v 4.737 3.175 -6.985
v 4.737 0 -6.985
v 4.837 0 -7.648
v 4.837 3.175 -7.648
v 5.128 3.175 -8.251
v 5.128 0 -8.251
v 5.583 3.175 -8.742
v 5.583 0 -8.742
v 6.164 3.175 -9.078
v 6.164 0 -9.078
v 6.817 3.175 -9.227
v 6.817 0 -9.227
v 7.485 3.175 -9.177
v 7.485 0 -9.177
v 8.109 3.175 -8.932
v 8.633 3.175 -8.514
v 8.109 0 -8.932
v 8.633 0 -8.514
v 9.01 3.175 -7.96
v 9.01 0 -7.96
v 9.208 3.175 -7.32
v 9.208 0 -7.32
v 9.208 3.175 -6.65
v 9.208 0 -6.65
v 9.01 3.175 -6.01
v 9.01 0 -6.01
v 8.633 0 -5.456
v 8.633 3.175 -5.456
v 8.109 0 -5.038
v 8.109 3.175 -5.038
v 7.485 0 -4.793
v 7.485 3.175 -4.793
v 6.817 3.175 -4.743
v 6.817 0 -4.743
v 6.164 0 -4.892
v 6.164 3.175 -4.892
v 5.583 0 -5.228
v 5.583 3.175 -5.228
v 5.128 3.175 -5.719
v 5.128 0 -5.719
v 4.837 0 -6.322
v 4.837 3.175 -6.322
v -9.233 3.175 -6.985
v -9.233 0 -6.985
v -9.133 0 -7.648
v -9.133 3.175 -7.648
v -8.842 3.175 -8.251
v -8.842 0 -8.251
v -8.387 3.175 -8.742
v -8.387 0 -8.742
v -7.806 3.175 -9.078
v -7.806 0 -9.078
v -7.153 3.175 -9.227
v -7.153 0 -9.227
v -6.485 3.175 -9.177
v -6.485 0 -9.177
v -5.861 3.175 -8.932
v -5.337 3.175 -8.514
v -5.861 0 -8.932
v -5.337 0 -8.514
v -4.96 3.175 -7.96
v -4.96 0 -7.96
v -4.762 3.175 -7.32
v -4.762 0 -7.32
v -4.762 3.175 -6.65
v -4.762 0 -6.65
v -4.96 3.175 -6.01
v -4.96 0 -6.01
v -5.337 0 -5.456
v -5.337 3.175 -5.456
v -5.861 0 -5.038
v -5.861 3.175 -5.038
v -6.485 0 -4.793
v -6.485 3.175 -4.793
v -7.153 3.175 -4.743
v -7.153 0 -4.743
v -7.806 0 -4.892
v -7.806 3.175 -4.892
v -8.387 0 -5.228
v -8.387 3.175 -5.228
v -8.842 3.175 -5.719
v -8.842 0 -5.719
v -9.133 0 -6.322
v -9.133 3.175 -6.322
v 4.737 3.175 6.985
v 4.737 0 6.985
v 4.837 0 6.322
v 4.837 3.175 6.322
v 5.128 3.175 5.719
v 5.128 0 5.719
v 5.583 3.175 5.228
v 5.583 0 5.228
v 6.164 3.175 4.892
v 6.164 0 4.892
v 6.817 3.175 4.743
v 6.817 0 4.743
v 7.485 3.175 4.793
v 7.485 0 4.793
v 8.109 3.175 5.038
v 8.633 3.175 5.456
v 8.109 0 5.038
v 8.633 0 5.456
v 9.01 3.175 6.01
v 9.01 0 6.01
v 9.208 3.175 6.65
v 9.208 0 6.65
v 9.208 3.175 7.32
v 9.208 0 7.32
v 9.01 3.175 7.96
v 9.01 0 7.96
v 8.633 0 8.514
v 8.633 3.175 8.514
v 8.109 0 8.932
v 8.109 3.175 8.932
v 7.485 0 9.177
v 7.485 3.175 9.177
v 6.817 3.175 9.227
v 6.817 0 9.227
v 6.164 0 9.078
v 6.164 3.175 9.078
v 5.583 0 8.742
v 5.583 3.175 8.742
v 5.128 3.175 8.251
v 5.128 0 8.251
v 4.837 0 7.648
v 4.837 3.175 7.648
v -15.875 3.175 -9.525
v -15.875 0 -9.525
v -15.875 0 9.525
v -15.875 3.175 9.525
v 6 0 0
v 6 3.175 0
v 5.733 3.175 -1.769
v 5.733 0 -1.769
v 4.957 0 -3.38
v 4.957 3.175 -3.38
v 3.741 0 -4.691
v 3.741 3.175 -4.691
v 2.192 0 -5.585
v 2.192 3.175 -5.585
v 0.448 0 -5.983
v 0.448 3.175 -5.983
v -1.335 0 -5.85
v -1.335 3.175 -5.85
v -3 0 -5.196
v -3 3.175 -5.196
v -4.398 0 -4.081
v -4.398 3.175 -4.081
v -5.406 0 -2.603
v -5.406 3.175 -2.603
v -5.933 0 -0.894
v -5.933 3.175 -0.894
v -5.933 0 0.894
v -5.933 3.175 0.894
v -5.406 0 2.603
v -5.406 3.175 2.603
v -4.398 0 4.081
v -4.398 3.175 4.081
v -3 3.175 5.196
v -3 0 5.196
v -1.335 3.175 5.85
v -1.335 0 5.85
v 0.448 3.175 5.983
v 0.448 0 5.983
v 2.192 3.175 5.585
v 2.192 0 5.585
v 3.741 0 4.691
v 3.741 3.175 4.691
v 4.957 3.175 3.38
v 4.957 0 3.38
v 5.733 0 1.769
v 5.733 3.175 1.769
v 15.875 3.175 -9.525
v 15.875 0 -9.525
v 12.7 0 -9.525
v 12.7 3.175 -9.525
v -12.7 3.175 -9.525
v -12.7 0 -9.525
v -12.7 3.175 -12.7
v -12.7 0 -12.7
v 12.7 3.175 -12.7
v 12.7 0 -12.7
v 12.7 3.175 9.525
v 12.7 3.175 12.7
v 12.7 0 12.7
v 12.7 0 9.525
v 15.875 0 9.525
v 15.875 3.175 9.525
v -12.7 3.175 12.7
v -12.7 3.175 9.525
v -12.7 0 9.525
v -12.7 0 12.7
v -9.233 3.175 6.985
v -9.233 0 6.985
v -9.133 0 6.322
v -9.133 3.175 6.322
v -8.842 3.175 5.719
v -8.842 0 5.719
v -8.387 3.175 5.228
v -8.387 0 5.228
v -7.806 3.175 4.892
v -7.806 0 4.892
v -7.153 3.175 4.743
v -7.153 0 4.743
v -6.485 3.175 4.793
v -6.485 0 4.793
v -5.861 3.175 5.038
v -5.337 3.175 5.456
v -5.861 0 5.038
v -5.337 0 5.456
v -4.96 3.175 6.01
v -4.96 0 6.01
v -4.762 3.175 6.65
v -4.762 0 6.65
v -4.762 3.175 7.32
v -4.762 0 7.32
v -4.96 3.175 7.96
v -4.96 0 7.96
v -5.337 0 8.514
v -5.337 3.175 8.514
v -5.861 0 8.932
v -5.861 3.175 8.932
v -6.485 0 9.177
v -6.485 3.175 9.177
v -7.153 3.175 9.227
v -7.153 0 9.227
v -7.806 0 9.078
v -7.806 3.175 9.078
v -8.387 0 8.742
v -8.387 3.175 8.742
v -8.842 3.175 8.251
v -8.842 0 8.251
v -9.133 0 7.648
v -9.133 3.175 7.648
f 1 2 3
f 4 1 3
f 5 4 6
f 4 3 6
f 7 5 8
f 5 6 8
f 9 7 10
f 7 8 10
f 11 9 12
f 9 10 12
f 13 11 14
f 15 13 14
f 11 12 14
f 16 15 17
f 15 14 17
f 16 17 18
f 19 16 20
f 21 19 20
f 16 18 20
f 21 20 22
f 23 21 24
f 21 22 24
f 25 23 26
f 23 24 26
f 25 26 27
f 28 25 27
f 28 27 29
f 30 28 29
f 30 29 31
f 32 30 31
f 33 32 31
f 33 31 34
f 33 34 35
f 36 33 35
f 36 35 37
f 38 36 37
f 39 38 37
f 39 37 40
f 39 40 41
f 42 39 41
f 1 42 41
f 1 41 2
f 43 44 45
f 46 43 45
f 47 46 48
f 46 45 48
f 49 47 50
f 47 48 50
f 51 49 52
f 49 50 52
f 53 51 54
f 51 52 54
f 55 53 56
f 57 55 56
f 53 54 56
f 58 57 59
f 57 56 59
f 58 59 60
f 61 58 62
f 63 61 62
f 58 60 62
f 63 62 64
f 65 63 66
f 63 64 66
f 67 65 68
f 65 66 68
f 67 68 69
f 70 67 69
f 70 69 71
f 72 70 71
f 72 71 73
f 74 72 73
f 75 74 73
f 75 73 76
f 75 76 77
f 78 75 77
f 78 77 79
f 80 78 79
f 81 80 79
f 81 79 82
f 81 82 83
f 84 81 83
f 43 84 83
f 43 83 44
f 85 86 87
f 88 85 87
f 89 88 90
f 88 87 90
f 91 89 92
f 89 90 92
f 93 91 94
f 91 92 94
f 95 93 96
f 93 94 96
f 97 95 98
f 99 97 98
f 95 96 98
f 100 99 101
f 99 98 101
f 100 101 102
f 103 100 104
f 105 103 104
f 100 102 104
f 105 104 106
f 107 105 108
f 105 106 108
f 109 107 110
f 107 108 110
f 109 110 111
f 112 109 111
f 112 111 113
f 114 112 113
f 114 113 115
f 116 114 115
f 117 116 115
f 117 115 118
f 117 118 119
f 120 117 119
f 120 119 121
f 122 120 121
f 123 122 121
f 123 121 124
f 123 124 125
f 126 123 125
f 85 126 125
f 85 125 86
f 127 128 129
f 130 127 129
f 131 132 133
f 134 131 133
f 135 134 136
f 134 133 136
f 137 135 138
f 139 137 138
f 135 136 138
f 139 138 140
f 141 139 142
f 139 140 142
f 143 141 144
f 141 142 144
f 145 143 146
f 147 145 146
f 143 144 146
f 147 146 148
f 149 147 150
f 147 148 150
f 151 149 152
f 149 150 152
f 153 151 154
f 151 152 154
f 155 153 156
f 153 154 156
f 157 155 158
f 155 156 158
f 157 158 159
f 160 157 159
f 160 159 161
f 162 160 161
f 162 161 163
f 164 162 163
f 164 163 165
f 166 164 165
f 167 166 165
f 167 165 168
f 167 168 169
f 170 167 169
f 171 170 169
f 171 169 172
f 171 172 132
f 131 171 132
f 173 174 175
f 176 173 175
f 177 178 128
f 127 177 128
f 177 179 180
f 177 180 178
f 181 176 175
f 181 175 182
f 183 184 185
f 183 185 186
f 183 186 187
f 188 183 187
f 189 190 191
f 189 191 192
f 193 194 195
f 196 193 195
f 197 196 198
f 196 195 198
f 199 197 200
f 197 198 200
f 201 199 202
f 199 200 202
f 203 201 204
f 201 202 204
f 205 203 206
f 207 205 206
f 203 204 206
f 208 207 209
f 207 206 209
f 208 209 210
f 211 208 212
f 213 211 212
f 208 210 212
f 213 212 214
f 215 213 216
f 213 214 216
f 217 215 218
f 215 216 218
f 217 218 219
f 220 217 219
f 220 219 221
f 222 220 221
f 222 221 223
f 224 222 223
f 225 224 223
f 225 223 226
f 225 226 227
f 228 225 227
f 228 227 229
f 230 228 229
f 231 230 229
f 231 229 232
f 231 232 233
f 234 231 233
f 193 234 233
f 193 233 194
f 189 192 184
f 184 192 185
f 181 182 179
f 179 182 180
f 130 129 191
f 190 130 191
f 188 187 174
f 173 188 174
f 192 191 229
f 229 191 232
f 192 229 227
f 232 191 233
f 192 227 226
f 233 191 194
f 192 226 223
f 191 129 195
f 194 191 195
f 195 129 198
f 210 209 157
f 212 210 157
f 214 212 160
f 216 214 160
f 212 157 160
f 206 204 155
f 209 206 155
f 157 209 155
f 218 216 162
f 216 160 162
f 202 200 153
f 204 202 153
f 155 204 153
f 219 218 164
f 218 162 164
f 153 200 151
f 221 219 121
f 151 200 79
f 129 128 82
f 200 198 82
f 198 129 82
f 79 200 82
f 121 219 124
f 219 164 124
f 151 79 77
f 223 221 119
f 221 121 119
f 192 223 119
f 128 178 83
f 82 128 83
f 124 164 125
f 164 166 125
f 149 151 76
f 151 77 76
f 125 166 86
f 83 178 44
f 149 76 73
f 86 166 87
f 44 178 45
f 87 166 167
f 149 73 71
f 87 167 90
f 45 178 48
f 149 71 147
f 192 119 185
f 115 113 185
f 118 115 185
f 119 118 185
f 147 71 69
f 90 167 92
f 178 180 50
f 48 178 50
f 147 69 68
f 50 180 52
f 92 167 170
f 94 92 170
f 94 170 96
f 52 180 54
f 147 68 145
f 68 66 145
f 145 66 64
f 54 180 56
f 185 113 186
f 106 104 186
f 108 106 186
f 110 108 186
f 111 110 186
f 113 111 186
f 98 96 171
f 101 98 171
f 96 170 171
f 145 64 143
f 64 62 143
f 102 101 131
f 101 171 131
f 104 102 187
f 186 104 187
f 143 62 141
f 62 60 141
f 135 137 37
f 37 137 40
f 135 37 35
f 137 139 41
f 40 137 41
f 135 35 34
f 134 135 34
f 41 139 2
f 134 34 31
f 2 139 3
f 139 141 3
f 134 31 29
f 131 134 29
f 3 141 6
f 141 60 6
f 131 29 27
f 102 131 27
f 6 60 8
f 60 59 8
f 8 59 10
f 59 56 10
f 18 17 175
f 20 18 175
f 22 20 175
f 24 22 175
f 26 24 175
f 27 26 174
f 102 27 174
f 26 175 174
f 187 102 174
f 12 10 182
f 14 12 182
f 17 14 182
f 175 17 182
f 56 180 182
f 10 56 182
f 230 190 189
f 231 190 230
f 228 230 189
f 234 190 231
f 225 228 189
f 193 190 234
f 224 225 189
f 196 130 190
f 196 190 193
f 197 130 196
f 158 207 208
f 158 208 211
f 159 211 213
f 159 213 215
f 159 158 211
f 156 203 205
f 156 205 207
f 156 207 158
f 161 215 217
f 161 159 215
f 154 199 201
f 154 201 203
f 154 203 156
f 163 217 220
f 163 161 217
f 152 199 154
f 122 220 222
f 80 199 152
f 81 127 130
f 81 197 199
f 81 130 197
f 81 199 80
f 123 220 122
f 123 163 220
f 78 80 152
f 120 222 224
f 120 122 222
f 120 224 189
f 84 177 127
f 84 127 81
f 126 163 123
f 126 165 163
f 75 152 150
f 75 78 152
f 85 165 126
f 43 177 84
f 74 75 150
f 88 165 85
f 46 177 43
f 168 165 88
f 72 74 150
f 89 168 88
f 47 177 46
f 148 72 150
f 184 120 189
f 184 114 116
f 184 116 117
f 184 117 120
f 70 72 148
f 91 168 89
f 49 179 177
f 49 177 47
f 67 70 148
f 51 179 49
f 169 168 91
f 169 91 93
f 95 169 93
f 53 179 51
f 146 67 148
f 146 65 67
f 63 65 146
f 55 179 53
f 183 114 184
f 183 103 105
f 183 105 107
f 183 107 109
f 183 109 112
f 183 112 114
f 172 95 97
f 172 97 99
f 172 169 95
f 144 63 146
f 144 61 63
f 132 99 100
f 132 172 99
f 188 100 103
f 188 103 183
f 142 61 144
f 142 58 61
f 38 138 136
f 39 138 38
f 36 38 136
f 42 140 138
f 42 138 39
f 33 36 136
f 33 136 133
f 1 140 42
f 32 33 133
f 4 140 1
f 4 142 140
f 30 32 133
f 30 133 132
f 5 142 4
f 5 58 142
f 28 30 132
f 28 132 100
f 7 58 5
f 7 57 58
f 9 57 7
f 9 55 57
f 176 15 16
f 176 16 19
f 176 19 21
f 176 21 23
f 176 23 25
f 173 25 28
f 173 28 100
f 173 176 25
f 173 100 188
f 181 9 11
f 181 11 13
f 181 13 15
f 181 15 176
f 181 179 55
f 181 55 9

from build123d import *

# Parameters (mm, degrees)
BOSS_EXTRUDE1_DEPTH   = 3.175
SKETCH2_R             = 6
CUT_EXTRUDE1_DEPTH    = 4.175
F_8_CLEARANCE_HOLE1_D = 4.4958


with BuildPart() as part:
    # Sketch1 → Boss-Extrude1 (new body)
    with BuildSketch(Plane(origin=(0, 0, 0), x_dir=(1, 0, 0), z_dir=(0, 1, 0))):
        Polygon((-12.7, 9.525), (-15.875, 9.525), (-15.875, -9.525), (-12.7, -9.525), (-12.7, -12.7), (12.7, -12.7), (12.7, -9.525), (15.875, -9.525), (15.875, 9.525), (12.7, 9.525), (12.7, 12.7), (-12.7, 12.7), align=None)
    extrude(amount=BOSS_EXTRUDE1_DEPTH)

    # Sketch2 → Cut-Extrude1 (cut, through all)
    with BuildSketch(Plane(origin=(0, 3.175, 0), x_dir=(1, 0, 0), z_dir=(0, 1, 0))):
        Circle(SKETCH2_R)
    extrude(amount=-CUT_EXTRUDE1_DEPTH, mode=Mode.SUBTRACT)

    # #8 Clearance Hole1 (through all)
    with Locations(Plane(origin=(0, 3.175, 0), x_dir=(1, 0, 0), z_dir=(0, 1, 0))):
        with Locations((-6.985, 6.985), (6.985, 6.985), (6.985, -6.985), (-6.985, -6.985)):
            Hole(F_8_CLEARANCE_HOLE1_D / 2)


solid = part.part
